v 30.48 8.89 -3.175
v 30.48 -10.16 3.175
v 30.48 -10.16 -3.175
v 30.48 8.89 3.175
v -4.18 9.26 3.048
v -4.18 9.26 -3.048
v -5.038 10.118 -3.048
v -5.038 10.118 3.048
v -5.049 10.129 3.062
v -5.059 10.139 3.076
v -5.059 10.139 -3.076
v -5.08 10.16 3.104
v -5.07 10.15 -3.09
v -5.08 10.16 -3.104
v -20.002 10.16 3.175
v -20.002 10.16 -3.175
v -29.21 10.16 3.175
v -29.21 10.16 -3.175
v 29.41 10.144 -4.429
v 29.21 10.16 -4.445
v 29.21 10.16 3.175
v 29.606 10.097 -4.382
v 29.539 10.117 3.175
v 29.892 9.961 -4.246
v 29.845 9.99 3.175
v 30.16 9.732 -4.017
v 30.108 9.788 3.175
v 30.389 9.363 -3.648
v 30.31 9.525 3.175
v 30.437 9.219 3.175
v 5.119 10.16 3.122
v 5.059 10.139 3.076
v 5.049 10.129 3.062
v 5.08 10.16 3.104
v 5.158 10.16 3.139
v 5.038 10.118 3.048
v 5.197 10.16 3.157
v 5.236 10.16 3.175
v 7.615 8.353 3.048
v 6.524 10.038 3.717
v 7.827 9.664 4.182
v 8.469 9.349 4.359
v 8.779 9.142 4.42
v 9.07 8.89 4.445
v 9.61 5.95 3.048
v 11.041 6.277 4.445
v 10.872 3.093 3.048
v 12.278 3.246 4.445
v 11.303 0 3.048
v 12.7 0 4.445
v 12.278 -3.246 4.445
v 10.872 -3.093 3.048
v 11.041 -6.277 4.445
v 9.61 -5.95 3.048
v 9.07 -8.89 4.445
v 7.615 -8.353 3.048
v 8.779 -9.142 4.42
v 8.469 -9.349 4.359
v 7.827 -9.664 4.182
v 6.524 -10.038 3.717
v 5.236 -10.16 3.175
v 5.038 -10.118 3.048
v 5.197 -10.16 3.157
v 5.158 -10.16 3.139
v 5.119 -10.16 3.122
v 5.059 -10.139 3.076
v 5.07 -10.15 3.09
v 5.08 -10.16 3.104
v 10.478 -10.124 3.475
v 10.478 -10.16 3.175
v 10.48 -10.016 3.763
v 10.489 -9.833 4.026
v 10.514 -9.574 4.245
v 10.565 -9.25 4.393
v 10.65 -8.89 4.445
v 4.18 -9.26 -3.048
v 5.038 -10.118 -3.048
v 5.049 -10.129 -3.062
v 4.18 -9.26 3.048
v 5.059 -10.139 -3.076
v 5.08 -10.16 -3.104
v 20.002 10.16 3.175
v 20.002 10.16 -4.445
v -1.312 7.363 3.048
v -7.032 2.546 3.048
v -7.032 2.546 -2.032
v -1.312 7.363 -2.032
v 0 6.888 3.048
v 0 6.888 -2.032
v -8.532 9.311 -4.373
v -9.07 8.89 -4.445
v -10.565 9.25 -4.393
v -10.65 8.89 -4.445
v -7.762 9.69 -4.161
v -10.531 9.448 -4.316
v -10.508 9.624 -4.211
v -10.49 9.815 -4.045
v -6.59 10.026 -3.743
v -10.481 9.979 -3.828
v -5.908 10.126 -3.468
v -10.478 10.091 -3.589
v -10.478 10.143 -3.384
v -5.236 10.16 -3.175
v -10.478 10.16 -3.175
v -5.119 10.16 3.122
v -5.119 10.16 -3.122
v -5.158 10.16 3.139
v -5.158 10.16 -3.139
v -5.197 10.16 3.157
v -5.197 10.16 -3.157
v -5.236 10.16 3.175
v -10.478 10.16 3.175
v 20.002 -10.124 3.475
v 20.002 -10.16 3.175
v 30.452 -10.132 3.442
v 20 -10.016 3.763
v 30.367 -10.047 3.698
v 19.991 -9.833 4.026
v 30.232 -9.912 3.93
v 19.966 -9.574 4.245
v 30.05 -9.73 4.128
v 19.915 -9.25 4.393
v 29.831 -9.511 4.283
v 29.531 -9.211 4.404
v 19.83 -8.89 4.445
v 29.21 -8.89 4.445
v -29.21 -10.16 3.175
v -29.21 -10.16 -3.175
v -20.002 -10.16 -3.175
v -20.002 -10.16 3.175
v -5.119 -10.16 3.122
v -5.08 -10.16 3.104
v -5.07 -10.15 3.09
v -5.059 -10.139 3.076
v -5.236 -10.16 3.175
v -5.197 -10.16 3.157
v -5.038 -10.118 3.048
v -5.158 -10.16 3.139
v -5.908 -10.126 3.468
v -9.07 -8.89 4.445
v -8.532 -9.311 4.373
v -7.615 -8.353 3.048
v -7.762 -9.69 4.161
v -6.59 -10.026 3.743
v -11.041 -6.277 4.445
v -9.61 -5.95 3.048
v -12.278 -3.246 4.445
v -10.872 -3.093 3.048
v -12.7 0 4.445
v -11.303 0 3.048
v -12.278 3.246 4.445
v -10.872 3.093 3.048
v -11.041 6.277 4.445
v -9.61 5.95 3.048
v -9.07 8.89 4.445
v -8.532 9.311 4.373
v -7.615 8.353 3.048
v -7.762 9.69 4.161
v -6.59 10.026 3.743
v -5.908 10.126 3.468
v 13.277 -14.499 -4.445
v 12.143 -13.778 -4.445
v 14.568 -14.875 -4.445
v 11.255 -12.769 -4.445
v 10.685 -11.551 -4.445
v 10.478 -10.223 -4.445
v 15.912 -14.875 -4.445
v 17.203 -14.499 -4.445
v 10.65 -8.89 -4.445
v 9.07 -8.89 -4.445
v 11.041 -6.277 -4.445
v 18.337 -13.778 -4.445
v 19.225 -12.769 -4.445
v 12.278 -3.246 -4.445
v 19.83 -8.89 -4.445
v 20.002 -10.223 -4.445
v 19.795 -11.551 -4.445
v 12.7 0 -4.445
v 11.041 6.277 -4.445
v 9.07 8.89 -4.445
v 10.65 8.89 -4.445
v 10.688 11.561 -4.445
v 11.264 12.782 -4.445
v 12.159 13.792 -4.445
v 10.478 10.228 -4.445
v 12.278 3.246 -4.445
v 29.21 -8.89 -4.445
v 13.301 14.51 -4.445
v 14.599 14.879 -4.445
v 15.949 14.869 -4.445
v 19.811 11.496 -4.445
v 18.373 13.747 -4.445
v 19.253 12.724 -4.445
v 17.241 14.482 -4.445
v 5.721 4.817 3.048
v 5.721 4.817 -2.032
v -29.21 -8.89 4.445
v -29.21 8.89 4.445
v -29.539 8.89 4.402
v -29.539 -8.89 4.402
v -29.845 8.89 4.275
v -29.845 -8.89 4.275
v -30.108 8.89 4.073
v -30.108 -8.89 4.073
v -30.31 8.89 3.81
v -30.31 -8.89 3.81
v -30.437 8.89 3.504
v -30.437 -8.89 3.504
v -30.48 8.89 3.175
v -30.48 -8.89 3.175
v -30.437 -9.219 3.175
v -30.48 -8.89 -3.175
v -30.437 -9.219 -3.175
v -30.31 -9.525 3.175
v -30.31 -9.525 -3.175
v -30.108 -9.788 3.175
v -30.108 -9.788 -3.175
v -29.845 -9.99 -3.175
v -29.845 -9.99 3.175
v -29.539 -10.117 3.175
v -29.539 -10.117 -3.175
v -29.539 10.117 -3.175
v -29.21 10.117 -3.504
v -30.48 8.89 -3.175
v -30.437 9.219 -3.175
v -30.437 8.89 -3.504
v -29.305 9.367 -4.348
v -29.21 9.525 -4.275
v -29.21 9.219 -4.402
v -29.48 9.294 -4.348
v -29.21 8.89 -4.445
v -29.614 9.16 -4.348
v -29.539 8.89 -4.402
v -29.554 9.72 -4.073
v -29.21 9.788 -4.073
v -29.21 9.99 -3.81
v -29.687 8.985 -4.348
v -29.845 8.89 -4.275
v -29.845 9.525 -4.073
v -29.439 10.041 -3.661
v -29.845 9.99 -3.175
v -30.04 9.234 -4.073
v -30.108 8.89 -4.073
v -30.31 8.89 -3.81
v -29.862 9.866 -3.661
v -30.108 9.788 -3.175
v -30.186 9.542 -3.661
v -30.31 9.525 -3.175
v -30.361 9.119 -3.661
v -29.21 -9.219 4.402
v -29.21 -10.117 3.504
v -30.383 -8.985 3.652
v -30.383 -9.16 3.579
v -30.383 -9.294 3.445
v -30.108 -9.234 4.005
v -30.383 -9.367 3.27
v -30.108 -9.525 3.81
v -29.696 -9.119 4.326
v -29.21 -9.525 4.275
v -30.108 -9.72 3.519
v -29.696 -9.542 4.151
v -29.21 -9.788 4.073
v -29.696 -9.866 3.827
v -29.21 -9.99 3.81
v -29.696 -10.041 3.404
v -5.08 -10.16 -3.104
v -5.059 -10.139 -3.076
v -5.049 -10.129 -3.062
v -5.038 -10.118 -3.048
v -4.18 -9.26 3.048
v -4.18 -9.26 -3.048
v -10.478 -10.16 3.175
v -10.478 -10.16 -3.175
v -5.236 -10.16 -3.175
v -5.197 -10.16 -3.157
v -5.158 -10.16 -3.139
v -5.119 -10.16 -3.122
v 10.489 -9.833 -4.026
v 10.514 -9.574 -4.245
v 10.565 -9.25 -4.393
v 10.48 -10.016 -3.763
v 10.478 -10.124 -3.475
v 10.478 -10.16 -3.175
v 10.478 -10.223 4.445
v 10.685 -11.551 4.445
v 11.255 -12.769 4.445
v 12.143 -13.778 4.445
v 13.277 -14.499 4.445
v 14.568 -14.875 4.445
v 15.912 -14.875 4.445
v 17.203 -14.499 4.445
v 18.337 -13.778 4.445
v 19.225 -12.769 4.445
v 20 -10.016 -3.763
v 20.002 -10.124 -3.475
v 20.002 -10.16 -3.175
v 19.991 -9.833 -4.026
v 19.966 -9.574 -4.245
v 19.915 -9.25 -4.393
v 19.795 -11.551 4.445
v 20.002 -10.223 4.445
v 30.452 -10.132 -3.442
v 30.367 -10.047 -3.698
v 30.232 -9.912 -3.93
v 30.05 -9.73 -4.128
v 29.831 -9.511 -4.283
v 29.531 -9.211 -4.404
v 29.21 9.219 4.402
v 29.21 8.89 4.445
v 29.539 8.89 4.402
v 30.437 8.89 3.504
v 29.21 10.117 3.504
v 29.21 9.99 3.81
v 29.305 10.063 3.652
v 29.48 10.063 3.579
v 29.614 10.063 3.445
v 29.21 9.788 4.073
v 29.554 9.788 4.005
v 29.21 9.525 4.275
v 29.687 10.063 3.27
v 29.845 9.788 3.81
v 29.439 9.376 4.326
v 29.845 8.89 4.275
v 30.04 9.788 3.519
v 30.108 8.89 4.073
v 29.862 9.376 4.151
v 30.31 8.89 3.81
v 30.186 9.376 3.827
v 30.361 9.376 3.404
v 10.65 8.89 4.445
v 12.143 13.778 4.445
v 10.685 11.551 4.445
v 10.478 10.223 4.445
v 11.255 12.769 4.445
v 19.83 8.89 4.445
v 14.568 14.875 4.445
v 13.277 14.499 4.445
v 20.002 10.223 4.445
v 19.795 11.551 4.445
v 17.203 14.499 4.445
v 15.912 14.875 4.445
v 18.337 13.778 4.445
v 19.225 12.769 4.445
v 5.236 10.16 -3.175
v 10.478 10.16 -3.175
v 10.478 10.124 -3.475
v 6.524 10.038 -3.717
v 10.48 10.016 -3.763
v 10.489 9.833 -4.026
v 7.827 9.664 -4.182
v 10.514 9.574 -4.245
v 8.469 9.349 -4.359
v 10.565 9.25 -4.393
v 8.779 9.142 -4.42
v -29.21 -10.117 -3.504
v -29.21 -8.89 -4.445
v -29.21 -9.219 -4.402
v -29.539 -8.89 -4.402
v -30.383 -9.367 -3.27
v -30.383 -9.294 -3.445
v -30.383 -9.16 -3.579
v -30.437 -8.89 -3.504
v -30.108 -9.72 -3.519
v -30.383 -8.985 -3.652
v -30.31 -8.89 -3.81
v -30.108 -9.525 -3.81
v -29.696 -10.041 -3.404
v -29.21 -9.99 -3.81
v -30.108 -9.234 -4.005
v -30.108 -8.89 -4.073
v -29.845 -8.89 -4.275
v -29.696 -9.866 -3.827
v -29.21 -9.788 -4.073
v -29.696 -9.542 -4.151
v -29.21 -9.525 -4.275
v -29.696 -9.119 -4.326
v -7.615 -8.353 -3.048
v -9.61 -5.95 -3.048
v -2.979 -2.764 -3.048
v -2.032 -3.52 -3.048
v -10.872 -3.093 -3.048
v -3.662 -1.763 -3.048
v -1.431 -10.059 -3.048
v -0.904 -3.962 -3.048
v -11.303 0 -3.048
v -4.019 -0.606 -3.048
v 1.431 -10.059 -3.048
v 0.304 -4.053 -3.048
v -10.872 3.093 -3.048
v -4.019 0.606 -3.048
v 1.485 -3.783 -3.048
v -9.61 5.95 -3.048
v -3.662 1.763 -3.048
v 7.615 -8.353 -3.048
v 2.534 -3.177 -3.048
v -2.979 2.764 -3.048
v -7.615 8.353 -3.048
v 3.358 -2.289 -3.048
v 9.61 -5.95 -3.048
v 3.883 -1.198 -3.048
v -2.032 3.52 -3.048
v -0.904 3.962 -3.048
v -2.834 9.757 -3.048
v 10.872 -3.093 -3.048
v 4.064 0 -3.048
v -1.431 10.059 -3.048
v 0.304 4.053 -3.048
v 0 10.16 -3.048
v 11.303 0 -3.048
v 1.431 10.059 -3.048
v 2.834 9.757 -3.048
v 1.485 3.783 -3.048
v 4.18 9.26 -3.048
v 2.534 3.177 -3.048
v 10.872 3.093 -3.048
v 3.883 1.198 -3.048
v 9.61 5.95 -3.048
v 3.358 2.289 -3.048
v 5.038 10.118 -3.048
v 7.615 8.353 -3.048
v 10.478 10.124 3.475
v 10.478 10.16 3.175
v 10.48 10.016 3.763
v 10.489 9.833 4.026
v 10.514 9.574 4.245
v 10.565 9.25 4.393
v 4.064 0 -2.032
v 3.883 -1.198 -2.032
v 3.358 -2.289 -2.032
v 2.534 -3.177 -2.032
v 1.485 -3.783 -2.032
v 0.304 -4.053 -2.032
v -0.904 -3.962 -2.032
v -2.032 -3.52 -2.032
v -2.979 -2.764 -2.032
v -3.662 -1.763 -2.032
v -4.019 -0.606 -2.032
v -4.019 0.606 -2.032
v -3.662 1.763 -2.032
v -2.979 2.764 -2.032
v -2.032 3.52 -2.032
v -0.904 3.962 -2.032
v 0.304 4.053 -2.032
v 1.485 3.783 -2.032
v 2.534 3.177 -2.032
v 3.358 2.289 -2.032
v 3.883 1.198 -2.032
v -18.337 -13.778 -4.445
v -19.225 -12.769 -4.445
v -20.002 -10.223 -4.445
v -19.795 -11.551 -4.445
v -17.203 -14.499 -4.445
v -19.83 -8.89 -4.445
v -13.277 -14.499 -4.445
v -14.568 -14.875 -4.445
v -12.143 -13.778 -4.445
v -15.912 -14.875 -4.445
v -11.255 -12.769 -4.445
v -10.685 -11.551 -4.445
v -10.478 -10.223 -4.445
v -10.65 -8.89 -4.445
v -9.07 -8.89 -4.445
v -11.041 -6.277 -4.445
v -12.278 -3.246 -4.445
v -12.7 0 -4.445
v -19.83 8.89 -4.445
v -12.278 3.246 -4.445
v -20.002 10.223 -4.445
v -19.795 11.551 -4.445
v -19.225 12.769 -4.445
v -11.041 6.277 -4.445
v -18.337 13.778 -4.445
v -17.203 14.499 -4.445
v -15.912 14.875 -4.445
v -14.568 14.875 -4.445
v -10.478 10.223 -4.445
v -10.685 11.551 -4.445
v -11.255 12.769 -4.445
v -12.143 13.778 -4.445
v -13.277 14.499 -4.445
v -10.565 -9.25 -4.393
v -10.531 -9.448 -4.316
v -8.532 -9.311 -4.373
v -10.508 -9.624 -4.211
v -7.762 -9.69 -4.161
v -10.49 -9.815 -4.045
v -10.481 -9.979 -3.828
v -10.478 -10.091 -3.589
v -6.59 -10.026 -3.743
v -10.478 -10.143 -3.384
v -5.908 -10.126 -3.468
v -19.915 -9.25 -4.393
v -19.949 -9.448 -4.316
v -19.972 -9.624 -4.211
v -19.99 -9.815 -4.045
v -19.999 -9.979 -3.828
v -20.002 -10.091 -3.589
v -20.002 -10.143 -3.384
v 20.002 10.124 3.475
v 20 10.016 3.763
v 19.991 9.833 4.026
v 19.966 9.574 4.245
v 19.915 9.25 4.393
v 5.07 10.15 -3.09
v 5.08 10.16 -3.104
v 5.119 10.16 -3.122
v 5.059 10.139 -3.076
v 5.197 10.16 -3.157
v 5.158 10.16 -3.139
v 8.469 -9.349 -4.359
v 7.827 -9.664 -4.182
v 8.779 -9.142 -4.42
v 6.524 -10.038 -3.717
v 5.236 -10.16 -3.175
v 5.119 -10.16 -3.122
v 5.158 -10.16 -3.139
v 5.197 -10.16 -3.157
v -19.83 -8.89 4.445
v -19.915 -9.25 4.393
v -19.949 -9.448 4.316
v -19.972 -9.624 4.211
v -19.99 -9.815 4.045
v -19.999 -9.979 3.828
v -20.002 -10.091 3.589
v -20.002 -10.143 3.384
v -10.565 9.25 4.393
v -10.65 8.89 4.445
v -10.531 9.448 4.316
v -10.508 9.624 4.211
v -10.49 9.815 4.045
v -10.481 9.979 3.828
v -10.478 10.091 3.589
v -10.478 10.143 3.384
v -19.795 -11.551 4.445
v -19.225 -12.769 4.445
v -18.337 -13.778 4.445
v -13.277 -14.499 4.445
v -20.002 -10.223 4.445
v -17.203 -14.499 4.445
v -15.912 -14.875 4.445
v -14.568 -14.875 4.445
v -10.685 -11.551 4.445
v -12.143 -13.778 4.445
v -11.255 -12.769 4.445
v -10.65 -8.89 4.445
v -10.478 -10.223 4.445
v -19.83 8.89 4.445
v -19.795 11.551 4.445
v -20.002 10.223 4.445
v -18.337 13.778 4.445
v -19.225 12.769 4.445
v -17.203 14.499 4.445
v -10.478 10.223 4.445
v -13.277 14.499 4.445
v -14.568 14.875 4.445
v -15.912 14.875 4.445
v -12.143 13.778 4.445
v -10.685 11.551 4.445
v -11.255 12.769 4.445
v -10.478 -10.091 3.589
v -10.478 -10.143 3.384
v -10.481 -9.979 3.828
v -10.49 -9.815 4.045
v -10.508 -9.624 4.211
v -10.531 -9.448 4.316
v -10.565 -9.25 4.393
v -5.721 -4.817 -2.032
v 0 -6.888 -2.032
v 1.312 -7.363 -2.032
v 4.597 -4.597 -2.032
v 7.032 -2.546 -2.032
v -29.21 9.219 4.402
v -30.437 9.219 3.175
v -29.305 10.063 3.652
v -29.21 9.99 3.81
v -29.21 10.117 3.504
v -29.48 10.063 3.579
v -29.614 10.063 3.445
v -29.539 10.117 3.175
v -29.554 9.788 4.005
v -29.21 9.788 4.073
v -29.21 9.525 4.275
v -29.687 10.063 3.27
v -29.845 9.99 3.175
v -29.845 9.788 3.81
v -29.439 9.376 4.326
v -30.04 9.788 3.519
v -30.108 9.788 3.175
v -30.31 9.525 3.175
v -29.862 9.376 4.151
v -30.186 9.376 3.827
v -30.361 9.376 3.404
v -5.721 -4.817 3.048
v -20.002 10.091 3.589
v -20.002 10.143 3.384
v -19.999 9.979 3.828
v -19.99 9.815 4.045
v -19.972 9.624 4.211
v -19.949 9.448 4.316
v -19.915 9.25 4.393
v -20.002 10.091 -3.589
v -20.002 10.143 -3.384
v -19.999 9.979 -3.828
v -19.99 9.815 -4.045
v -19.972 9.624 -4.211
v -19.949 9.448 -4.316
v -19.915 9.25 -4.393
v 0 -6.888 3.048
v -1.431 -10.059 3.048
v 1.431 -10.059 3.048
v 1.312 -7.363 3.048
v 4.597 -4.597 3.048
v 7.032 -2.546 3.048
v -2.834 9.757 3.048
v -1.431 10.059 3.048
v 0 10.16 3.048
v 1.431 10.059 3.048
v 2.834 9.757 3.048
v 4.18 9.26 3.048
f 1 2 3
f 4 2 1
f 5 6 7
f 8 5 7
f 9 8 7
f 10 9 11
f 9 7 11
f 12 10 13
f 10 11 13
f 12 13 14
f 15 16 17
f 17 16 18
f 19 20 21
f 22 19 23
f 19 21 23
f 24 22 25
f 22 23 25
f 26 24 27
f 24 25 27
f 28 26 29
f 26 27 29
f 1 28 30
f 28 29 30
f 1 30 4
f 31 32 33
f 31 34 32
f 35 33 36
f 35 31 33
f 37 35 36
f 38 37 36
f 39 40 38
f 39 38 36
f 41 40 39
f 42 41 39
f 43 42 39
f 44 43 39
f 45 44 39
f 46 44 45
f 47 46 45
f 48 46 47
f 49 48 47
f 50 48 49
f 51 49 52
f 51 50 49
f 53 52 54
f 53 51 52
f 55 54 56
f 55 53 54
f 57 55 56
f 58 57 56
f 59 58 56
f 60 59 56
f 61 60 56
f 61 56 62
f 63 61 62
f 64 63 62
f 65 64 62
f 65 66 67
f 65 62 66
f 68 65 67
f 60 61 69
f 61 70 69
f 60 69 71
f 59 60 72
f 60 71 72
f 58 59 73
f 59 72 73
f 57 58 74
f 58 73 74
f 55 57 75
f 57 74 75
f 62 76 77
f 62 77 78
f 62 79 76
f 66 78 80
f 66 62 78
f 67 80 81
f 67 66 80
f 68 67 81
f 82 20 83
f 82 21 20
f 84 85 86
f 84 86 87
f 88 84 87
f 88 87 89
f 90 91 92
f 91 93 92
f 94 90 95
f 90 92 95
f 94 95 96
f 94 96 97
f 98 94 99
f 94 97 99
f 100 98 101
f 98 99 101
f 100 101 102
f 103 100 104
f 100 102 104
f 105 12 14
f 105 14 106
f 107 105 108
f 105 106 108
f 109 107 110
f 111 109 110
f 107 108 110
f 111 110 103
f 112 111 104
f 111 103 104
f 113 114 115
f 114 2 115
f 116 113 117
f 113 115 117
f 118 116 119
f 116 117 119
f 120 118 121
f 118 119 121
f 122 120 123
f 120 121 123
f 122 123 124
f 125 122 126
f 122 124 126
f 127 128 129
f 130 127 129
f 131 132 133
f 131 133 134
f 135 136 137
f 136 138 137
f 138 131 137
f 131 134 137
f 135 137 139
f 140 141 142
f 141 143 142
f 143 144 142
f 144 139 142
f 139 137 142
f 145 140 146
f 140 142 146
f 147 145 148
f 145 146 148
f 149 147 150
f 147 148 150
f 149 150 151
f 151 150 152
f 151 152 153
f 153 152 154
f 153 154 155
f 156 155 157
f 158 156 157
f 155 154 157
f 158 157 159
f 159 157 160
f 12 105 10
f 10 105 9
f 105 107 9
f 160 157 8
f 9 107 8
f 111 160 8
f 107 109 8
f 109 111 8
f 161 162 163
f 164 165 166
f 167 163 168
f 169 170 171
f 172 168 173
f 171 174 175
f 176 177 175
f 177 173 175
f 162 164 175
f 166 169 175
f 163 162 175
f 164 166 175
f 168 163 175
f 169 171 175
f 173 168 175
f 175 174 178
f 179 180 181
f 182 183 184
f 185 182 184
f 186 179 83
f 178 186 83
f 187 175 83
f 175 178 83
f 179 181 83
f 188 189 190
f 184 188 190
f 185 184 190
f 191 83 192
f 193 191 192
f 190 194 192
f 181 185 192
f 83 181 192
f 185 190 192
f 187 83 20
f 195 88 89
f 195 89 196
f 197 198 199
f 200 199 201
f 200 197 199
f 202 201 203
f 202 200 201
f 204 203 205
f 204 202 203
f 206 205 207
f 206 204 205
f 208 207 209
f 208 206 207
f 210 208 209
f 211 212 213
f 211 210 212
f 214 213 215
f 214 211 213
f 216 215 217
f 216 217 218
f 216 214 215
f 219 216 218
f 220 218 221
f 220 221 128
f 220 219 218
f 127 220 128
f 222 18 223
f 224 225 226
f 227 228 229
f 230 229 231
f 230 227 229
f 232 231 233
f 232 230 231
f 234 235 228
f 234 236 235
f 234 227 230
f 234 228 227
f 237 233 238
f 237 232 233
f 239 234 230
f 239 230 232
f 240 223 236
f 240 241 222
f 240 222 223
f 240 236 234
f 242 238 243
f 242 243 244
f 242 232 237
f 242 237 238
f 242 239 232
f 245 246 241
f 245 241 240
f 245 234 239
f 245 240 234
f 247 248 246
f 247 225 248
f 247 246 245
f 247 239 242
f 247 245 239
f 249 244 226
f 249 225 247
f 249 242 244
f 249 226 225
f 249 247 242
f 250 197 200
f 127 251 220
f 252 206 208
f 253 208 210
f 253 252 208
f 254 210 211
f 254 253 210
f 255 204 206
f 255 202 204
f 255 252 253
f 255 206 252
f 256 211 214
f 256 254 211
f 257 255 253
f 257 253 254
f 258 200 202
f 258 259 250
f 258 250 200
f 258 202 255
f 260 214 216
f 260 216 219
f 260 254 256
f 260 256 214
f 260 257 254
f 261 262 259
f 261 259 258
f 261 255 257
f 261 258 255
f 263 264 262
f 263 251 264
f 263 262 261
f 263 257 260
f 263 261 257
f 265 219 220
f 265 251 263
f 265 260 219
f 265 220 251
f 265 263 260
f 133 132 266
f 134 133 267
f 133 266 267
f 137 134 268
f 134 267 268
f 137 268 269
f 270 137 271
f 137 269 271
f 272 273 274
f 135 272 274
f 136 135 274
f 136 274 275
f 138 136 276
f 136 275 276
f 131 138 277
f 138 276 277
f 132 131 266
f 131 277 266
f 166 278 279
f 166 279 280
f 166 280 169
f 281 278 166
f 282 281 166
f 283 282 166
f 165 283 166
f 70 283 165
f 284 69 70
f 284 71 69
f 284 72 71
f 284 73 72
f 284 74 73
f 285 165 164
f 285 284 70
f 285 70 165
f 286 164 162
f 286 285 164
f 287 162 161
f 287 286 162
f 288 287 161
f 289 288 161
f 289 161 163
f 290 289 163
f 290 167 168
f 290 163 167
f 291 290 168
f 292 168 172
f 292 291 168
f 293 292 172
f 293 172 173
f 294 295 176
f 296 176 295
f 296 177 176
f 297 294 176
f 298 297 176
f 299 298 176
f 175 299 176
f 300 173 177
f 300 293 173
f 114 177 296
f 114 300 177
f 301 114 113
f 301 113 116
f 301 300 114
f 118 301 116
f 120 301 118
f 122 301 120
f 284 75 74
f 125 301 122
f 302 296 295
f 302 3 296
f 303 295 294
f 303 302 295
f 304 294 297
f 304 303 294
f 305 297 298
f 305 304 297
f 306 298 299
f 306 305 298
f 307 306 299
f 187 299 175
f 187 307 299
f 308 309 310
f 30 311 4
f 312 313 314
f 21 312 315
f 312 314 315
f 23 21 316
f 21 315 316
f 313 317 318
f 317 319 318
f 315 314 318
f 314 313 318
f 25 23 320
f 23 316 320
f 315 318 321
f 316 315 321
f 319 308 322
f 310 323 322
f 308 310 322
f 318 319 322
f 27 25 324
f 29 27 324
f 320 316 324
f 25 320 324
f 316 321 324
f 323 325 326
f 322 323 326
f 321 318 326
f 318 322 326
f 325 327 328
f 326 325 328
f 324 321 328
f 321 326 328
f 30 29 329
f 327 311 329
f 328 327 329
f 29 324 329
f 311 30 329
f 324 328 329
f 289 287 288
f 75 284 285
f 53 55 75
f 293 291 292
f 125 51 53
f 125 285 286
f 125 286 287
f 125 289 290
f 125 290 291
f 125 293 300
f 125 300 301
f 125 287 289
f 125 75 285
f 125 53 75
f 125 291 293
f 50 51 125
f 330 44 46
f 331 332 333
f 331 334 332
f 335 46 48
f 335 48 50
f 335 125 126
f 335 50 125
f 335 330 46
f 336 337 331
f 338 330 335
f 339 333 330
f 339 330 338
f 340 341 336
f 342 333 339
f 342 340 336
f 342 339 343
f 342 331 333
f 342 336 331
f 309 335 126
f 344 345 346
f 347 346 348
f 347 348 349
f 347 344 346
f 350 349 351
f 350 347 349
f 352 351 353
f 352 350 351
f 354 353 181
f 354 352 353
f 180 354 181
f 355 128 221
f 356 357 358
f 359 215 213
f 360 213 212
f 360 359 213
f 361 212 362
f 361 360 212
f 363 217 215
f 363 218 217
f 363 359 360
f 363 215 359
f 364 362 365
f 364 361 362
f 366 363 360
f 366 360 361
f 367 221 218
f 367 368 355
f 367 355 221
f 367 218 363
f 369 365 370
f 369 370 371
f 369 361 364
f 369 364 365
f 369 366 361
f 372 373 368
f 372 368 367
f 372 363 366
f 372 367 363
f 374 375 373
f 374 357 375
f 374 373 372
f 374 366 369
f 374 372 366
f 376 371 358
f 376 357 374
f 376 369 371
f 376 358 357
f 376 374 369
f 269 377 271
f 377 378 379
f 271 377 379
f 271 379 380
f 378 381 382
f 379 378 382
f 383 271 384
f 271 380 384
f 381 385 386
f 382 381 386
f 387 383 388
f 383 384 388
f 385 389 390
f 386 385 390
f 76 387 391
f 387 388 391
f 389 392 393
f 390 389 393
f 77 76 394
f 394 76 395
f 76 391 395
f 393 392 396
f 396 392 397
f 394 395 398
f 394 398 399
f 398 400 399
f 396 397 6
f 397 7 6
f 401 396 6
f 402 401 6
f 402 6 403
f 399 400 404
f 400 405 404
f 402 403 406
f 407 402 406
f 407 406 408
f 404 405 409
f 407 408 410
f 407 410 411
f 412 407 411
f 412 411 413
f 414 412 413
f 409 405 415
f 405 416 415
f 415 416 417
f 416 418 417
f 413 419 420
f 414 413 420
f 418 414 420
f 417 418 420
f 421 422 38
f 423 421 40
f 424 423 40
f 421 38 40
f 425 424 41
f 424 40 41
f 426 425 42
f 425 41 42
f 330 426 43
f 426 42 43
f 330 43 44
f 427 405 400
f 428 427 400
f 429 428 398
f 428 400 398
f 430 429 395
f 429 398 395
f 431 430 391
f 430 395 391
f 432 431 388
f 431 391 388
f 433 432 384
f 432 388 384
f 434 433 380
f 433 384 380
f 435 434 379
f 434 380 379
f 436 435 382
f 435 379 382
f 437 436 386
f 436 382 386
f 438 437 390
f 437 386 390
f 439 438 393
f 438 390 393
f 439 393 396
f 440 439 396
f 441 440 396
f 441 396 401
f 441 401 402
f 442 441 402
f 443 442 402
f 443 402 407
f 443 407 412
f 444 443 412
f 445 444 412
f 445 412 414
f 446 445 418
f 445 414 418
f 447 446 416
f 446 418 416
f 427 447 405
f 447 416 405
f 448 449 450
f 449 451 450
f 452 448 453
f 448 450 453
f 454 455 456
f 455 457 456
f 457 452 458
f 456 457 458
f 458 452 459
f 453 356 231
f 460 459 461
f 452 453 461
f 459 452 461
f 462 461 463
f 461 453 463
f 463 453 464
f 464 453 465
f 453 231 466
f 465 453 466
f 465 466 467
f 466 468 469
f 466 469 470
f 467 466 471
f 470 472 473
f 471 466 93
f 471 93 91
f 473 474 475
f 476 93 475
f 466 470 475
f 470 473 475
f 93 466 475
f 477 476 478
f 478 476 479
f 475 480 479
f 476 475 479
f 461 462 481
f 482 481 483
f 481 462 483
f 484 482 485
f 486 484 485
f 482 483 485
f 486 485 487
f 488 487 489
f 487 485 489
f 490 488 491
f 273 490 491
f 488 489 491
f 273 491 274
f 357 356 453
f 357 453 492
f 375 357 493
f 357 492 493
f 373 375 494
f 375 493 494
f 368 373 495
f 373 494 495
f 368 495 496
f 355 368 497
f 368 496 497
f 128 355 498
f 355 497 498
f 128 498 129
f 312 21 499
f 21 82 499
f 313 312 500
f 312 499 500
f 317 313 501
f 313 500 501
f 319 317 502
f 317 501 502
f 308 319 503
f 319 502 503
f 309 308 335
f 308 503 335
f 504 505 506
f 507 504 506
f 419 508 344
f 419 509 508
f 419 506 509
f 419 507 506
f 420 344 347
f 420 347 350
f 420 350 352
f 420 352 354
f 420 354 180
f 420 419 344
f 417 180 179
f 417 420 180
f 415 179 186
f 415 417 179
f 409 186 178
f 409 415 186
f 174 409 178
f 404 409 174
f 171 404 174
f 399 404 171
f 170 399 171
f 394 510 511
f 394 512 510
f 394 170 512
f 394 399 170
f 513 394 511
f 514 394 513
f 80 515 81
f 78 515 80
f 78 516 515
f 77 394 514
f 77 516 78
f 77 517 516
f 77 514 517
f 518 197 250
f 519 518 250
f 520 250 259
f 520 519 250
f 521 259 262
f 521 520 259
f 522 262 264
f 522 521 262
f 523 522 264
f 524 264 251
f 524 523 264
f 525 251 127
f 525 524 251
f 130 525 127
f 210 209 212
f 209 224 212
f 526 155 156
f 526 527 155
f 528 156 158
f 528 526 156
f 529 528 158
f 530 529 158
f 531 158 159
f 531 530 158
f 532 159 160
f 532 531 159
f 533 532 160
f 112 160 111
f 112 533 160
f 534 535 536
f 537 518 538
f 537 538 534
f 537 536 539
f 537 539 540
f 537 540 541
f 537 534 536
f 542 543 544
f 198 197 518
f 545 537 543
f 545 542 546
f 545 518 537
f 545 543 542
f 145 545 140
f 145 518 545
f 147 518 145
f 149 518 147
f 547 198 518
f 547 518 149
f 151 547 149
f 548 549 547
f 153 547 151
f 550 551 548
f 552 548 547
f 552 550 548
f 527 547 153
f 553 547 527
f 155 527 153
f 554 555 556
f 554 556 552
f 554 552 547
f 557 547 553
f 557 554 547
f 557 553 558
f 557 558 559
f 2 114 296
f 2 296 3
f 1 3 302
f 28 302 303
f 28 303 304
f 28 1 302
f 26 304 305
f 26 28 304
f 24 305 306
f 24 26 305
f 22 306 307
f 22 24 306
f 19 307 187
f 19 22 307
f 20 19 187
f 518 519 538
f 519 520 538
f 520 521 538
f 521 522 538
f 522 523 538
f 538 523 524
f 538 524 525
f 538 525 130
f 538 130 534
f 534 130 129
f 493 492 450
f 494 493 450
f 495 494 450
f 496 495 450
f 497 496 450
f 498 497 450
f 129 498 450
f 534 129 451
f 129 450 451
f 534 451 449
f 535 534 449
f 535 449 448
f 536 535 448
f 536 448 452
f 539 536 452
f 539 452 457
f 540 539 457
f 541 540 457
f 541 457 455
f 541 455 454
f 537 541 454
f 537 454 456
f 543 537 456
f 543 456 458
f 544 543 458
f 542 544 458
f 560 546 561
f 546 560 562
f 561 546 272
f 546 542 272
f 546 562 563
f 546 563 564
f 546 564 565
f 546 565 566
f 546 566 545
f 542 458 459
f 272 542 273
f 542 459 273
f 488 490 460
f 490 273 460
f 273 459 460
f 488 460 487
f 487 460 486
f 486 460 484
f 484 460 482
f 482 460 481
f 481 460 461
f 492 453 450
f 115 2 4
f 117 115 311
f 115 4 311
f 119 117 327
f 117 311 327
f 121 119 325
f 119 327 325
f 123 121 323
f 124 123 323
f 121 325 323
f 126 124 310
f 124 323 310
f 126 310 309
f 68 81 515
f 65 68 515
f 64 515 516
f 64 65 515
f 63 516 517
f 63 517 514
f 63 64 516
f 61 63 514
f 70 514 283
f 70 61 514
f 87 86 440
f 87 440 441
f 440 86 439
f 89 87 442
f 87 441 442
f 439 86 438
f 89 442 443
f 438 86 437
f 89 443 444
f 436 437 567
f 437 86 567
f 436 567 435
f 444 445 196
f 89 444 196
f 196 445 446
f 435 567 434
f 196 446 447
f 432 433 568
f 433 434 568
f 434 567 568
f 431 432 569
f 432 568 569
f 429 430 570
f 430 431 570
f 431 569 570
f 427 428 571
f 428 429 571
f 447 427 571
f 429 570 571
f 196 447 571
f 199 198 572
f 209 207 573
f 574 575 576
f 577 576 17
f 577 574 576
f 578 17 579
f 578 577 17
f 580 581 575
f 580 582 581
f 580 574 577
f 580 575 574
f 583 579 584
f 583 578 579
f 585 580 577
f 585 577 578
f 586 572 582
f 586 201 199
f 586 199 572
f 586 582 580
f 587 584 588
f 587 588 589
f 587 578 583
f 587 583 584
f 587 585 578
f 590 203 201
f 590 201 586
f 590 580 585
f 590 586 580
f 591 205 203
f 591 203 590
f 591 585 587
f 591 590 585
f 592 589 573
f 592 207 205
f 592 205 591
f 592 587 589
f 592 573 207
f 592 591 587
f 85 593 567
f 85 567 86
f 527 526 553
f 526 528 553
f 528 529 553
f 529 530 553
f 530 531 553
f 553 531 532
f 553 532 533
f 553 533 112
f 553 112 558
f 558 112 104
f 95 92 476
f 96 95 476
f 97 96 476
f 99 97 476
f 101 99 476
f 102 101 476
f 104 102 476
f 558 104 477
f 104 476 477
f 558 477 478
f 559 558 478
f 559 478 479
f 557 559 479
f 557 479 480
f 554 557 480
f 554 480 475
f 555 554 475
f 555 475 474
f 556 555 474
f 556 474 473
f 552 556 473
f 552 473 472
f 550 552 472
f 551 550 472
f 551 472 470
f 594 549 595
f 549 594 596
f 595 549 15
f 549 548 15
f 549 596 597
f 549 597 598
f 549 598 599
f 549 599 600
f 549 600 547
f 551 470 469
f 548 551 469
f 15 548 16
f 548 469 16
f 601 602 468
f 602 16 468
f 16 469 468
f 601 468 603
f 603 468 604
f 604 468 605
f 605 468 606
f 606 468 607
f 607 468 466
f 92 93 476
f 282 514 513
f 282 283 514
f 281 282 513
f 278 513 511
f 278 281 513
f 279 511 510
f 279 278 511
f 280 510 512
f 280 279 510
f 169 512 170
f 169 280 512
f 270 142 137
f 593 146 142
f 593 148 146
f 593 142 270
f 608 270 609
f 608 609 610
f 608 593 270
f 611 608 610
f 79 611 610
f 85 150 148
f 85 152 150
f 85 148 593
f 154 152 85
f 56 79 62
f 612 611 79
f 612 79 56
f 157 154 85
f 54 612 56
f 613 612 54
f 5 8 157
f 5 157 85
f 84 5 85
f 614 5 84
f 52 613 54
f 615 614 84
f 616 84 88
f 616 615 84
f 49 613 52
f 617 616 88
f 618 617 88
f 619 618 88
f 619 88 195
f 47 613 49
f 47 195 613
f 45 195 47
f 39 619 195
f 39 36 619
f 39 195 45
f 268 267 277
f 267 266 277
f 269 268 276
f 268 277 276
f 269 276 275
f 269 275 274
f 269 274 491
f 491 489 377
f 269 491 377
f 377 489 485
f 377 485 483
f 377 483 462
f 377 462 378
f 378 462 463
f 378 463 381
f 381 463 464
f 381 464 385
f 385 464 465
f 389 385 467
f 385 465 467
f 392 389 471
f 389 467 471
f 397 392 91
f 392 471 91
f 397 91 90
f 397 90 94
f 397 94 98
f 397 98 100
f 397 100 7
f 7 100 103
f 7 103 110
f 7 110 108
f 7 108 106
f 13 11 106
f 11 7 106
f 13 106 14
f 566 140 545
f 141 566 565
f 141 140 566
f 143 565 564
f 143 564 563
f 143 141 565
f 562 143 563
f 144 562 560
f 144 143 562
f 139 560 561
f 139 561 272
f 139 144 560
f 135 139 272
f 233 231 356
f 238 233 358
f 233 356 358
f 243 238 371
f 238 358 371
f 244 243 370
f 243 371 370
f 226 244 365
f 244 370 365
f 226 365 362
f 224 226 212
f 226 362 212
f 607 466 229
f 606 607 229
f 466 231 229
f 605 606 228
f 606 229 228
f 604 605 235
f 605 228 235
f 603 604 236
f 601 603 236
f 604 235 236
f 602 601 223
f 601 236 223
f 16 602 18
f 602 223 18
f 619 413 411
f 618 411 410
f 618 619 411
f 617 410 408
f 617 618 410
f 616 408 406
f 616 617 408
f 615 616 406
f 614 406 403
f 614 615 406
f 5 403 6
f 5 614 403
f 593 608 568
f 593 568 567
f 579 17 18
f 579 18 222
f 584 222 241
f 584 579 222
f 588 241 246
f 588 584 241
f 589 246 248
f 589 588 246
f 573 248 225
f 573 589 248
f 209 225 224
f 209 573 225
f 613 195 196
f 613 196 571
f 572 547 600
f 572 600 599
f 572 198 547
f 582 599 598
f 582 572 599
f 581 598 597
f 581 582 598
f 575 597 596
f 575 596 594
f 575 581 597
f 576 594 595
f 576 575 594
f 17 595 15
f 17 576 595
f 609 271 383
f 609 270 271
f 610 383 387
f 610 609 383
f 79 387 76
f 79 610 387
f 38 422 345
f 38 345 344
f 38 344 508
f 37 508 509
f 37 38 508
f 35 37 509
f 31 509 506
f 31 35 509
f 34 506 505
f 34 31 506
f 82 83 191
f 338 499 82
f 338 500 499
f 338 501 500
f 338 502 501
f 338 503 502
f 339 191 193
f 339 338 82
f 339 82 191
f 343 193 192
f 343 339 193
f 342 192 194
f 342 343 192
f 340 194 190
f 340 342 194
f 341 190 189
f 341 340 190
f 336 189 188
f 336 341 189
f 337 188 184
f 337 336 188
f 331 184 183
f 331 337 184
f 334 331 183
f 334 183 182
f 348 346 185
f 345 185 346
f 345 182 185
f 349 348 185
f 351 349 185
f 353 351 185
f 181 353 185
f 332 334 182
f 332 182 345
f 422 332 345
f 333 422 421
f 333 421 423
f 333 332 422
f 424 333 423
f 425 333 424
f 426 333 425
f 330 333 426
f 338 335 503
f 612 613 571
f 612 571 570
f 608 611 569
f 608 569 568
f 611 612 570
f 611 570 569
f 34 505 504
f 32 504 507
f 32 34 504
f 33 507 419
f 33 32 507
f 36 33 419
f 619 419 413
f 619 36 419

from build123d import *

# Parameters (mm, degrees)
F1_DEPTH     = 3.048
F2_DEPTH     = 4.445
F3_T4_ANGLE  = 205.1460272103
F3_T9_ANGLE  = 205.1460272103
F3_T14_ANGLE = 205.1460272103
F3_T19_ANGLE = 205.1460272103
F4_R         = 1.27
F5_R         = 4.064
F6_DEPTH     = 1.016


# Not quite as in the source:
# - a fillet or chamfer that OpenCascade refuses, or shapes differently, is made with other operations: its cross-section is extruded or revolved along the edge and cut away or added


with BuildPart() as f1:
    # F0 (on Top) → F1 (new body, symmetric)
    with BuildSketch(Plane.XY):
        with BuildLine():
            ThreePointArc((4.1802083301, 9.2602083301), (2.1379760717, 9.932505138), (0, 10.16))
            ThreePointArc((0, 10.16), (-2.1379760717, 9.932505138), (-4.1802083301, 9.2602083301))
            ThreePointArc((-4.1802083301, 9.2602083301), (-10.16, 0), (-4.1802083301, -9.2602083301))
            ThreePointArc((-4.1802083301, -9.2602083301), (0, -10.16), (4.1802083301, -9.2602083301))
            ThreePointArc((4.1802083301, -9.2602083301), (8.5351191156, -5.511564359), (10.16, 0))
            ThreePointArc((10.16, 0), (8.5351191156, 5.511564359), (4.1802083301, 9.2602083301))
        make_face()
        Polygon((-5.7207672085, -4.8174884064), (-7.0324509466, 2.5455855286), (-1.3116837381, 7.3630739349), (0, 6.8882745845), (5.7207672085, 4.8174884064), (7.0324509466, -2.5455855286), (4.5967240587, -4.5967240587), (1.3116837381, -7.3630739349), (0, -6.8882745845), align=None, mode=Mode.SUBTRACT)
    extrude(amount=F1_DEPTH, both=True)

    # F0 (on Top) → F2 (join, symmetric)
    with BuildSketch(Plane.XY):
        with BuildLine():
            ThreePointArc((-4.1802083301, -9.2602083301), (-10.16, 0), (-4.1802083301, 9.2602083301))
            Line((-4.1802083301, 9.2602083301), (-5.08, 10.16))
            Line((-5.08, 10.16), (-10.4775, 10.16))
            ThreePointArc((-10.4775, 10.16), (-15.24, 14.9225), (-20.0025, 10.16))
            Line((-20.0025, 10.16), (-30.48, 10.16))
            Line((-30.48, 10.16), (-30.48, -10.16))
            Line((-30.48, -10.16), (-20.0025, -10.16))
            ThreePointArc((-20.0025, -10.16), (-15.24, -14.9225), (-10.4775, -10.16))
            Line((-10.4775, -10.16), (-5.08, -10.16))
            Line((-5.08, -10.16), (-4.1802083301, -9.2602083301))
        make_face()
        with BuildLine():
            Line((5.08, 10.16), (4.1802083301, 9.2602083301))
            ThreePointArc((4.1802083301, 9.2602083301), (8.5351191156, 5.511564359), (10.16, 0))
            ThreePointArc((10.16, 0), (8.5351191156, -5.511564359), (4.1802083301, -9.2602083301))
            Line((4.1802083301, -9.2602083301), (5.08, -10.16))
            Line((5.08, -10.16), (10.4775, -10.16))
            ThreePointArc((10.4775, -10.16), (15.24, -14.9225), (20.0025, -10.16))
            Line((20.0025, -10.16), (30.48, -10.16))
            Line((30.48, -10.16), (30.48, 10.16))
            Line((30.48, 10.16), (20.0025, 10.16))
            ThreePointArc((20.0025, 10.16), (15.24, 14.9225), (10.4775, 10.16))
            Line((10.4775, 10.16), (5.08, 10.16))
        make_face()
    extrude(amount=F2_DEPTH, both=True)

    # F3: chamfer of 2.54 on 4 edges, made by hand


with BuildPart() as f3_tool2:
    # F3_s3 → F3_t4 (revolve)
    with BuildSketch(Plane(origin=(0, 0, 0), x_dir=(0, 0, 1), z_dir=(0.9760193995, 0.217683559, 0))):
        Polygon((4.445, 12.7), (1.905, 10.16), (4.445, 10.16), align=None)
    revolve(axis=Axis((0, 0, 4.445), (0, 0, -1)), revolution_arc=F3_T4_ANGLE)

    split(bisect_by=Plane.XY.offset(3.048), keep=Keep.TOP)


with BuildPart() as f1_1:
    add(f1.part)

    # F3_t1: cut F3_tool2
    add(f3_tool2.part, mode=Mode.SUBTRACT)


with BuildPart() as f3_tool7:
    # F3_s8 → F3_t9 (revolve)
    with BuildSketch(Plane(origin=(0, 0, 0), x_dir=(0, 0, 1), z_dir=(-0.9760193995, -0.217683559, 0))):
        Polygon((1.905, 10.16), (4.445, 12.7), (4.445, 10.16), align=None)
    revolve(axis=Axis((0, 0, 4.445), (0, 0, -1)), revolution_arc=F3_T9_ANGLE)

    split(bisect_by=Plane.XY.offset(3.048), keep=Keep.TOP)


with BuildPart() as f1_2:
    add(f1_1.part)

    # F3_t6: cut F3_tool7
    add(f3_tool7.part, mode=Mode.SUBTRACT)


with BuildPart() as f3_tool12:
    # F3_s13 → F3_t14 (revolve)
    with BuildSketch(Plane(origin=(0, 0, 0), x_dir=(0, 0, 1), z_dir=(-0.9760193995, -0.217683559, 0))):
        Polygon((-4.445, 12.7), (-1.905, 10.16), (-4.445, 10.16), align=None)
    revolve(axis=Axis((0, 0, -4.445), (0, 0, -1)), revolution_arc=F3_T14_ANGLE)

    split(bisect_by=Plane.XY.offset(-3.048), keep=Keep.BOTTOM)


with BuildPart() as f1_3:
    add(f1_2.part)

    # F3_t11: cut F3_tool12
    add(f3_tool12.part, mode=Mode.SUBTRACT)


with BuildPart() as f3_tool17:
    # F3_s18 → F3_t19 (revolve)
    with BuildSketch(Plane(origin=(0, 0, 0), x_dir=(0, 0, 1), z_dir=(0.9760193995, 0.217683559, 0))):
        Polygon((-1.905, 10.16), (-4.445, 12.7), (-4.445, 10.16), align=None)
    revolve(axis=Axis((0, 0, -4.445), (0, 0, -1)), revolution_arc=F3_T19_ANGLE)

    split(bisect_by=Plane.XY.offset(-3.048), keep=Keep.BOTTOM)


with BuildPart() as f1_4:
    add(f1_3.part)

    # F3_t16: cut F3_tool17
    add(f3_tool17.part, mode=Mode.SUBTRACT)

    # F4
    f4_edges = [f1_4.edges().sort_by_distance(p)[0] for p in [
        (-25.24125, -10.16, 4.445),
        (-30.48, 0, 4.445),
        (-25.24125, 10.16, 4.445),
        (25.24125, -10.16, 4.445),
        (30.48, 0, 4.445),
        (25.24125, 10.16, 4.445),
        (-25.24125, -10.16, -4.445),
        (-30.48, -10.16, 0),
        (25.24125, -10.16, -4.445),
        (30.48, 0, -4.445),
        (30.48, 10.16, 0),
        (-30.48, 10.16, 0),
        (-25.24125, 10.16, -4.445),
        (-30.48, 0, -4.445),
        (-9.04875, 10.16, 4.445),
        (9.04875, 10.16, 4.445),
        (-9.04875, -10.16, 4.445),
        (9.04875, -10.16, 4.445),
        (9.04875, 10.16, -4.445),
        (-9.04875, 10.16, -4.445),
        (-9.04875, -10.16, -4.445),
        (9.04875, -10.16, -4.445),
    ]]
    fillet(f4_edges, radius=F4_R)

    # F5 (on face) → F6 (join)
    with BuildSketch(Plane(origin=(0, 0, -3.048), x_dir=(1, 0, 0), z_dir=(0, 0, -1))):
        with BuildLine():
            ThreePointArc((4.4189755144, -9.4989755144), (8.8332738002, -5.6330413093), (10.4765395251, 0))
            ThreePointArc((10.4765395251, 0), (8.8332738002, 5.6330413093), (4.4189755144, 9.4989755144))
            Line((4.4189755144, 9.4989755144), (4.1802083301, 9.2602083301))
            ThreePointArc((4.1802083301, 9.2602083301), (0, 10.16), (-4.1802083301, 9.2602083301))
            Line((-4.1802083301, 9.2602083301), (-4.4189755144, 9.4989755144))
            ThreePointArc((-4.4189755144, 9.4989755144), (-10.4765395251, 0), (-4.4189755144, -9.4989755144))
            Line((-4.4189755144, -9.4989755144), (-4.1802083301, -9.2602083301))
            ThreePointArc((-4.1802083301, -9.2602083301), (0, -10.16), (4.1802083301, -9.2602083301))
            Line((4.1802083301, -9.2602083301), (4.4189755144, -9.4989755144))
        make_face()
        Polygon((-1.3116837381, -7.3630739349), (-7.0324509466, -2.5455855286), (-5.7207672085, 4.8174884064), (1.3116837381, 7.3630739349), (7.0324509466, 2.5455855286), (5.7207672085, -4.8174884064), align=None, mode=Mode.SUBTRACT)
        Polygon((-5.7207672085, 4.8174884064), (-7.0324509466, -2.5455855286), (-1.3116837381, -7.3630739349), (5.7207672085, -4.8174884064), (7.0324509466, 2.5455855286), (1.3116837381, 7.3630739349), align=None)
        Circle(F5_R, mode=Mode.SUBTRACT)
    extrude(amount=-F6_DEPTH)


solid = f1_4.part
